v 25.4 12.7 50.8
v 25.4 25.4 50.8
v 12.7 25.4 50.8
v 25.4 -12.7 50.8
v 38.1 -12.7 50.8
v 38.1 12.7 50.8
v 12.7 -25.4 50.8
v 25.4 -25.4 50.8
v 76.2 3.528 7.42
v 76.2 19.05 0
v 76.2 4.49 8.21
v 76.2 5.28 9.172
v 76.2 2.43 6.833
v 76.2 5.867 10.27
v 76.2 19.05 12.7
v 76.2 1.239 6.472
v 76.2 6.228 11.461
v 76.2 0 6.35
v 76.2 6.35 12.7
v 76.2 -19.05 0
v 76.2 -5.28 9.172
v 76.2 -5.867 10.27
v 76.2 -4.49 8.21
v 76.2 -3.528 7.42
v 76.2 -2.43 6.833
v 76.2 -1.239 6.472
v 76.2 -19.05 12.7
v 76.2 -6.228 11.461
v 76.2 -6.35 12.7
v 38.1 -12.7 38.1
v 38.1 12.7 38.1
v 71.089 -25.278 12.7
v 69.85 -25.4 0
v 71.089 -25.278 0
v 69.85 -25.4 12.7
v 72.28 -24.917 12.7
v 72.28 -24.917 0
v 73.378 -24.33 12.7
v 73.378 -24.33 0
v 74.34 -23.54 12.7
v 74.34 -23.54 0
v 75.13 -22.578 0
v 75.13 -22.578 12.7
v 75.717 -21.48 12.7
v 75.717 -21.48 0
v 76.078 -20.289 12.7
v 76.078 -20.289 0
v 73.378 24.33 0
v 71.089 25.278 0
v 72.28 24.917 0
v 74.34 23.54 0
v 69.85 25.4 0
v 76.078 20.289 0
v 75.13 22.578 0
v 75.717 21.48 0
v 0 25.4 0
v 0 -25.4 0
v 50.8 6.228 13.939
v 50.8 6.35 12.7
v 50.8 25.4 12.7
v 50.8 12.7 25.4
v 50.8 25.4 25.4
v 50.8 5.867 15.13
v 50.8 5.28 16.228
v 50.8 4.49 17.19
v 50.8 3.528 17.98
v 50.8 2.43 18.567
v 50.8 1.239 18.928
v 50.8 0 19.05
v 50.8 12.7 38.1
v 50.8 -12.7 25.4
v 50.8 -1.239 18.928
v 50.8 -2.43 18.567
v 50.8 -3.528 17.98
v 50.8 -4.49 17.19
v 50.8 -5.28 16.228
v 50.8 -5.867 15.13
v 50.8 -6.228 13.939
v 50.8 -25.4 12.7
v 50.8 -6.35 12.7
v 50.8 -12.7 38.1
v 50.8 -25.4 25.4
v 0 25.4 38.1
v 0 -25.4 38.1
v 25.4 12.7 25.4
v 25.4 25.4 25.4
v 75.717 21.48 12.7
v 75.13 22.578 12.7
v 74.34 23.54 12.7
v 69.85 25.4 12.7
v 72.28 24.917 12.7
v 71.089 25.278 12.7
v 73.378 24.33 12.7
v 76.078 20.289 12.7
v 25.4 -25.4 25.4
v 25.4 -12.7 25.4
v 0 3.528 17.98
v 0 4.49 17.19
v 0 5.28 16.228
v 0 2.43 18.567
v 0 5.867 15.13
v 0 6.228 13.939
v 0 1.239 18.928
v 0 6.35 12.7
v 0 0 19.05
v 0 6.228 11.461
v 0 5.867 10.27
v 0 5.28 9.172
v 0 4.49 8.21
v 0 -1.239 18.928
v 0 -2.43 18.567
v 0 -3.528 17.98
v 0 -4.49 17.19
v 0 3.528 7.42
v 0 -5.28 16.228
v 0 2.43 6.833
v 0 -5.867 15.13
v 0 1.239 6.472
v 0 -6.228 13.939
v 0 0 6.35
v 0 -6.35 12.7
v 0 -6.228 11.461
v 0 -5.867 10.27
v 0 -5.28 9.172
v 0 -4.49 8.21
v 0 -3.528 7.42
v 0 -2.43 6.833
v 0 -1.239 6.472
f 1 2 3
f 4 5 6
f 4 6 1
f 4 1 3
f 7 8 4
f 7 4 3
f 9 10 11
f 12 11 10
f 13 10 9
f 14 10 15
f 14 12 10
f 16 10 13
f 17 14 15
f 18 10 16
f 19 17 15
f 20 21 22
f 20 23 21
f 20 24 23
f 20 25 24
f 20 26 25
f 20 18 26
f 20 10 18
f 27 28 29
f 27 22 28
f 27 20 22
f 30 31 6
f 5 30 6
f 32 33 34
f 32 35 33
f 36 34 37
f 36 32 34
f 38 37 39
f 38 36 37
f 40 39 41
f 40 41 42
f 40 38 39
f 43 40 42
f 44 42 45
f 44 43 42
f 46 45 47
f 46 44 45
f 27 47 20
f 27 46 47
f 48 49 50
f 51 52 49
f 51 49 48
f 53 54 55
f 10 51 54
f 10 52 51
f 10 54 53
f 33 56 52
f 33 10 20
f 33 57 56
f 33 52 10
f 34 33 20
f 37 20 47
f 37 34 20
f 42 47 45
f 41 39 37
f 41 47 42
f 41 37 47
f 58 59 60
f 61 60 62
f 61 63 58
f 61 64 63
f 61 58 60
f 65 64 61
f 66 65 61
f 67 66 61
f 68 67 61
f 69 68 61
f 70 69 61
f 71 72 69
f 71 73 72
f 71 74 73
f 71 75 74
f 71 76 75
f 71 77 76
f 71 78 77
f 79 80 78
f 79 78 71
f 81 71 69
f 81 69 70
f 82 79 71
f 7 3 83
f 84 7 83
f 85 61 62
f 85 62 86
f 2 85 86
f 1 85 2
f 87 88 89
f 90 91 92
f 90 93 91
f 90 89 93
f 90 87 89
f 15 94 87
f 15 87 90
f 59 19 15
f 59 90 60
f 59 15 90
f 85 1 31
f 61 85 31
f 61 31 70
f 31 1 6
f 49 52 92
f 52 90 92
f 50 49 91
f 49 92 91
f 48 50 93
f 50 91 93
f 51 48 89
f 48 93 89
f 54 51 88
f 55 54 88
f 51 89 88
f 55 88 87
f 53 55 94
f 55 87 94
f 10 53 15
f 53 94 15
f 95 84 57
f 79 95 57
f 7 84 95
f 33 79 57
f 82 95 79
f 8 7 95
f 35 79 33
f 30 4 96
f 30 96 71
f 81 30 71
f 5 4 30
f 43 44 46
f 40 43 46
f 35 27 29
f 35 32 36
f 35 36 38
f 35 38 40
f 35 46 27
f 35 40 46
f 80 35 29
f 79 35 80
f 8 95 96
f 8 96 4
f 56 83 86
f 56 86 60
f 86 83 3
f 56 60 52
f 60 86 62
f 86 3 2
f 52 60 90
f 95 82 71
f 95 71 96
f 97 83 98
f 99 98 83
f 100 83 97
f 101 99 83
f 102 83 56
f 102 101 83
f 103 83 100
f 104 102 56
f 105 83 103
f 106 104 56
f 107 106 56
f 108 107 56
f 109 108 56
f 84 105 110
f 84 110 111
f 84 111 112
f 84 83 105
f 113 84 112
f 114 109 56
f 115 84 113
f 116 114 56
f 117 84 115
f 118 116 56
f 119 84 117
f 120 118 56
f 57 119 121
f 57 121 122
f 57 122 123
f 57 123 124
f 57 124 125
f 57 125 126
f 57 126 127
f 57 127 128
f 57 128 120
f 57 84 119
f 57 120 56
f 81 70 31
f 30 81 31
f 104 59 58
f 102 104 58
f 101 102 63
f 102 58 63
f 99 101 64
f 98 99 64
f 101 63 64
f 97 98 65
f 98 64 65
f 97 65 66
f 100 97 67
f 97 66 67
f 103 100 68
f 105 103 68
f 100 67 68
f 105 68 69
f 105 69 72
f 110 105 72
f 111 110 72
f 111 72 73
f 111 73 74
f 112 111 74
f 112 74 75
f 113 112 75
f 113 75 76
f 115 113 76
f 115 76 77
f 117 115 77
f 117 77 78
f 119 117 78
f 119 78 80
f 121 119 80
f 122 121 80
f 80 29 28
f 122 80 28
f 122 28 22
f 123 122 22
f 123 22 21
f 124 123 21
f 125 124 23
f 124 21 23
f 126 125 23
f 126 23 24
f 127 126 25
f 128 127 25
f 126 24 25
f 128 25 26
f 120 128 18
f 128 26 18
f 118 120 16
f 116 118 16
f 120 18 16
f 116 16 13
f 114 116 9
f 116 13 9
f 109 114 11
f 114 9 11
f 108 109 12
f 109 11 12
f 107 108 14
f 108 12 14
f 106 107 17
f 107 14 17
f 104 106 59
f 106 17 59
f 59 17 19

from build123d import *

# Parameters (mm, degrees)
F1_DEPTH = 25.4
F3_DEPTH = 12.7
F4_R     = 6.35
F5_DEPTH = 76.201
F6_R     = 6.35


with BuildPart() as f1:
    # F0 (on Front) → F1 (new body, symmetric)
    with BuildSketch(Plane.XZ):
        Polygon((0, 38.1), (0, 0), (76.2, 0), (76.2, 12.7), (50.8, 12.7), (50.8, 25.4), (25.4, 25.4), (25.4, 50.8), (12.7, 50.8), align=None)
    extrude(amount=F1_DEPTH, both=True)

    # F2 (on Front) → F3 (join, symmetric)
    with BuildSketch(Plane.XZ):
        Polygon((25.4, 50.8), (25.4, 25.4), (50.8, 25.4), (50.8, 38.1), (38.1, 38.1), (38.1, 50.8), align=None)
    extrude(amount=F3_DEPTH, both=True)

    # F4 (on face) → F5 (cut, through all)
    with BuildSketch(Plane.YZ.offset(76.2)):
        with Locations((0, 12.7)):
            Circle(F4_R)
    extrude(amount=-F5_DEPTH, mode=Mode.SUBTRACT)

    # F6
    f6_edges = [f1.edges().sort_by_distance(p)[0] for p in [
        (76.2, -25.4, 6.35),
        (76.2, 25.4, 6.35),
    ]]
    fillet(f6_edges, radius=F6_R)


solid = f1.part
